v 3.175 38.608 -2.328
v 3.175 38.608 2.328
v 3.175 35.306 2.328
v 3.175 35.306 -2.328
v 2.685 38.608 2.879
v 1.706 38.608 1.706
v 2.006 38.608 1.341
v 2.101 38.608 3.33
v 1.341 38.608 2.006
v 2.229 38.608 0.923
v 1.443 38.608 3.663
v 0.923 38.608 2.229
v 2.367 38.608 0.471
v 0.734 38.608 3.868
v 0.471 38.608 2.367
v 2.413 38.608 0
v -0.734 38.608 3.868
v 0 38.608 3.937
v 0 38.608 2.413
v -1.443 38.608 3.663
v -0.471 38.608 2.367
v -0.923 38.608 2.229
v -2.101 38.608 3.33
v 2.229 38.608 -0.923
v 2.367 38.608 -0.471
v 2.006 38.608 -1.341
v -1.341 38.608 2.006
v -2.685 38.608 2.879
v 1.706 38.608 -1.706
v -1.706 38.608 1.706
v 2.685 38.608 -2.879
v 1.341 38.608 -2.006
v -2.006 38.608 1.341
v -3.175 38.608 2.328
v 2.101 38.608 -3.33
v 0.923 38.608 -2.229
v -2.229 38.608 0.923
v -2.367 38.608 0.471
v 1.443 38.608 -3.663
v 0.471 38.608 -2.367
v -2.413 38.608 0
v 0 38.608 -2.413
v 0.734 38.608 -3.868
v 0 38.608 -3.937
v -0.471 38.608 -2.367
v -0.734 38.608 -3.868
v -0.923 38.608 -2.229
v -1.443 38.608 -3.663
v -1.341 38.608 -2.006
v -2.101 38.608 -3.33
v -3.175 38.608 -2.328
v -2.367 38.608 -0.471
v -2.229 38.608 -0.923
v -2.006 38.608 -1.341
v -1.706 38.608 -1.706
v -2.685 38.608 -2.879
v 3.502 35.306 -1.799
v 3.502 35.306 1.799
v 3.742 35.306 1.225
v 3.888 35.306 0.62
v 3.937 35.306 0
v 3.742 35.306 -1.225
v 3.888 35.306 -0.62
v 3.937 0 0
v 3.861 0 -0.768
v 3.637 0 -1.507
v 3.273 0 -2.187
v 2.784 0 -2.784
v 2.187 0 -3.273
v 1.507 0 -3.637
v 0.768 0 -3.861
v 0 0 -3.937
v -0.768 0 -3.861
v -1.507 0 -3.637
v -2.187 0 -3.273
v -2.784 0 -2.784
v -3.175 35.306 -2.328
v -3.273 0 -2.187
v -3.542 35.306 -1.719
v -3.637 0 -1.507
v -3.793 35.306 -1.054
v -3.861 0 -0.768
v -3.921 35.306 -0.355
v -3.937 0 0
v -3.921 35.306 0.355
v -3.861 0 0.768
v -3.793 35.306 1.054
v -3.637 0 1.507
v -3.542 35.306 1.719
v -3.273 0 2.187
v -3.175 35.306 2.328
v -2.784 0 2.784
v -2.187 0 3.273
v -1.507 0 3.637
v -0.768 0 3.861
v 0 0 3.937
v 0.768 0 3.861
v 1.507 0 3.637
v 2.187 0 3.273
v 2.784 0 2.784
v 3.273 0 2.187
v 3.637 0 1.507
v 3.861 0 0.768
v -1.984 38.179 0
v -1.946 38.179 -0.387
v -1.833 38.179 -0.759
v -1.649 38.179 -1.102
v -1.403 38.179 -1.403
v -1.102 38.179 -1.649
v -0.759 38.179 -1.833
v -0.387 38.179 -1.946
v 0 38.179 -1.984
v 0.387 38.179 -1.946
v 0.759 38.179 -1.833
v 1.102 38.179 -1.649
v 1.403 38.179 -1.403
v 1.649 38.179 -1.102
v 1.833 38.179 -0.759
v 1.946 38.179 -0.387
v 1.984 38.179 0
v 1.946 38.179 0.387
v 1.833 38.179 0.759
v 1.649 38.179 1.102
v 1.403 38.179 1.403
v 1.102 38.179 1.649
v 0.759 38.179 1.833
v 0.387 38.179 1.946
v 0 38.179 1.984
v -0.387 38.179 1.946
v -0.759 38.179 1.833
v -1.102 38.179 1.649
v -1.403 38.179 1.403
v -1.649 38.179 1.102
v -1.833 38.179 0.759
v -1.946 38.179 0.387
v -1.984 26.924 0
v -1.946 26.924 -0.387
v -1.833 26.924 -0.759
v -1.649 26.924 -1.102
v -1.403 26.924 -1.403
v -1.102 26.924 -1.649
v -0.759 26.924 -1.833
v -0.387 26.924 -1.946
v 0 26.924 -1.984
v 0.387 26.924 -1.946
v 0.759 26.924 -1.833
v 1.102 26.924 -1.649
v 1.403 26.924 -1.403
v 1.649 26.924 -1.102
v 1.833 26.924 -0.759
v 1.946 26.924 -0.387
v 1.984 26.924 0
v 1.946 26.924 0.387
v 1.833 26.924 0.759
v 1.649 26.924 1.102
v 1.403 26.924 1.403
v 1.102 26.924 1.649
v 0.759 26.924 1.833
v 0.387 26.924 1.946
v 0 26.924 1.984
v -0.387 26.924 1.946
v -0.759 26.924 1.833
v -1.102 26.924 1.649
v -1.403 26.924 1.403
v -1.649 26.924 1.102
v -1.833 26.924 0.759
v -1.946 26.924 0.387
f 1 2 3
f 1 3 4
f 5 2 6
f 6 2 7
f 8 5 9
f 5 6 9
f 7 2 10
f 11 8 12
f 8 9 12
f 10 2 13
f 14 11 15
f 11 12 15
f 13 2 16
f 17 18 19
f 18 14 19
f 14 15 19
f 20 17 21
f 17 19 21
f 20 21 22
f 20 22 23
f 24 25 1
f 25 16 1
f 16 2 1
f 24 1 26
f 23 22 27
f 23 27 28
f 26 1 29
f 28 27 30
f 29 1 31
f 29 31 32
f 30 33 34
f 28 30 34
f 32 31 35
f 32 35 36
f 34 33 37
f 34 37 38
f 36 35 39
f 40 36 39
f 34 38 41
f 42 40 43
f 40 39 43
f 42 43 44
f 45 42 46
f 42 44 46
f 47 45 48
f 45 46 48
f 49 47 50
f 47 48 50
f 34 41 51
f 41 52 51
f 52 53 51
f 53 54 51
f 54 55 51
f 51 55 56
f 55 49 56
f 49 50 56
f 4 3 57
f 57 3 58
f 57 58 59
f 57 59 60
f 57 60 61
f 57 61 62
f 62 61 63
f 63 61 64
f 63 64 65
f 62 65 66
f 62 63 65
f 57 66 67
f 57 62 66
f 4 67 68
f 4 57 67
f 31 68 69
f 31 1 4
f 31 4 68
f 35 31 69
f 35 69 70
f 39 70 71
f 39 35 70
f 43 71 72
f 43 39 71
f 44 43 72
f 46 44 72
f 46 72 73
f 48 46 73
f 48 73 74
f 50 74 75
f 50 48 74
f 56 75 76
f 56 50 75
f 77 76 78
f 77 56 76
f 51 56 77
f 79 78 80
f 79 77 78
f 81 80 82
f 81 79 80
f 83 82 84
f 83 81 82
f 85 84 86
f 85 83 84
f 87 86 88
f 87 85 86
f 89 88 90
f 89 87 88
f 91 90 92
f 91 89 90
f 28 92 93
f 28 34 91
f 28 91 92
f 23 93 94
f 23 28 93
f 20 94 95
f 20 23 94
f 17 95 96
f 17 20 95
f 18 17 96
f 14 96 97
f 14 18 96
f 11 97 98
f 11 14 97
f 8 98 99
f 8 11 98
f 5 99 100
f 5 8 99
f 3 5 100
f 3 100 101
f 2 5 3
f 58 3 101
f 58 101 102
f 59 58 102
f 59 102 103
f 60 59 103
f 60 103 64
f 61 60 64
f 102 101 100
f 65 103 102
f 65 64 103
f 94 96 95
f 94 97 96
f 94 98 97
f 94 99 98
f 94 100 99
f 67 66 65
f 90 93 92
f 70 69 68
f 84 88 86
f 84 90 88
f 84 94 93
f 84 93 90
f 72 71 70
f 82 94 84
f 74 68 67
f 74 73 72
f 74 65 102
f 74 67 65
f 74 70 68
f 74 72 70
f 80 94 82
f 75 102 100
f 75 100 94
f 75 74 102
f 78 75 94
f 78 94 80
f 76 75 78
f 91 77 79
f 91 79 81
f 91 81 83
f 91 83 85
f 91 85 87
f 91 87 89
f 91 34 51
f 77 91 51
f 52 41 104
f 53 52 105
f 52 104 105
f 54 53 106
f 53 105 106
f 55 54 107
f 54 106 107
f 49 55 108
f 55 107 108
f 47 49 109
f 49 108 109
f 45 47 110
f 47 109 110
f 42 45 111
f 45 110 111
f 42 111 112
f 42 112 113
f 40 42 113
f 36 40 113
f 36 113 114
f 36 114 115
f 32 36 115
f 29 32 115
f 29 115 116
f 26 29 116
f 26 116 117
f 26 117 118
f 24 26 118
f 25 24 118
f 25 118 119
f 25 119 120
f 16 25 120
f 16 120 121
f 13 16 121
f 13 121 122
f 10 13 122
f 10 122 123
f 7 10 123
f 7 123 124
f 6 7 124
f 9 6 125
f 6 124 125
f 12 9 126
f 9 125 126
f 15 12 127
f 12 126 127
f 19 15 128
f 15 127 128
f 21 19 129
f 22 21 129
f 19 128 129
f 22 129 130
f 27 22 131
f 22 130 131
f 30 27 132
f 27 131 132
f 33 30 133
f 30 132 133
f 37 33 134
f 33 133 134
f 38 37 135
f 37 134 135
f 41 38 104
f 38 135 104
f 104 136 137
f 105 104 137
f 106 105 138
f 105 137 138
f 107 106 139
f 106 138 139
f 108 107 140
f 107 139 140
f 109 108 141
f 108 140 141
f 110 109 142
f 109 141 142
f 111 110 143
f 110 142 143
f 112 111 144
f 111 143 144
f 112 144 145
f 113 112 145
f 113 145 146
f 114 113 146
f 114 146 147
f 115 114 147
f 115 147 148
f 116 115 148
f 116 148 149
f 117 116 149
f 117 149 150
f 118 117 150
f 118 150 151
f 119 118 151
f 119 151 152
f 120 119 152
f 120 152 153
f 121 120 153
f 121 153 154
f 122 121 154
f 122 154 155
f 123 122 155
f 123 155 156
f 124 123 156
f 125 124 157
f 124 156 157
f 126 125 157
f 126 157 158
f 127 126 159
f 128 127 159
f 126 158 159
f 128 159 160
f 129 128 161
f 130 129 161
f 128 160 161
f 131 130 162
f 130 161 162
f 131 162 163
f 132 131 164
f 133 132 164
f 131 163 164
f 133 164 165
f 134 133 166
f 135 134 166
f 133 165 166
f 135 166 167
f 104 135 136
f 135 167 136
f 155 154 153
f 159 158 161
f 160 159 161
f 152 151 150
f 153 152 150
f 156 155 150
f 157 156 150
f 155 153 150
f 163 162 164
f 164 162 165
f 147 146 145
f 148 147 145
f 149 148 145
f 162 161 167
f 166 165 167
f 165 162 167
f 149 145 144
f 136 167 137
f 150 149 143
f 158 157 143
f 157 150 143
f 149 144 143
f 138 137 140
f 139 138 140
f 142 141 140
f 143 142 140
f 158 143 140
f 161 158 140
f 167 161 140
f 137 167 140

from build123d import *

# Parameters (mm, degrees)
SKETCH1_W          = 3.937
SKETCH1_H          = 38.608
HOLE1_D            = 3.96748
HOLE1_DEPTH        = 11.684
HOLE1_CSINK_D      = 4.826
HOLE1_CSINK_ANGLE  = 90
SKETCH4_W          = 12.7
SKETCH4_H          = 31.496
SKETCH4_W_2        = 6.35
SKETCH4_H_2        = 15.748
CUT_EXTRUDE1_DEPTH = 3.302


with BuildPart() as part:
    # Sketch1 → Revolve1 (revolve)
    with BuildSketch(Plane.XY):
        with Locations((1.9685, 19.304)):
            Rectangle(SKETCH1_W, SKETCH1_H)
    revolve(axis=Axis((0, 0, 0), (0, 1, 0)))

    # Hole1
    with Locations(Plane(origin=(0, 38.608, 0), x_dir=(1, 0, 0), z_dir=(0, 1, 0))):
        with Locations((0, 0)):
            CounterSinkHole(HOLE1_D / 2, HOLE1_CSINK_D / 2, depth=HOLE1_DEPTH, counter_sink_angle=HOLE1_CSINK_ANGLE)

    # Sketch4 → Cut-Extrude1 (cut)
    with BuildSketch(Plane(origin=(0, 38.608, 0), x_dir=(1, 0, 0), z_dir=(0, 1, 0))):
        Rectangle(SKETCH4_W, SKETCH4_H)
        Rectangle(SKETCH4_W_2, SKETCH4_H_2, mode=Mode.SUBTRACT)
    extrude(amount=-CUT_EXTRUDE1_DEPTH, mode=Mode.SUBTRACT)


solid = part.part
